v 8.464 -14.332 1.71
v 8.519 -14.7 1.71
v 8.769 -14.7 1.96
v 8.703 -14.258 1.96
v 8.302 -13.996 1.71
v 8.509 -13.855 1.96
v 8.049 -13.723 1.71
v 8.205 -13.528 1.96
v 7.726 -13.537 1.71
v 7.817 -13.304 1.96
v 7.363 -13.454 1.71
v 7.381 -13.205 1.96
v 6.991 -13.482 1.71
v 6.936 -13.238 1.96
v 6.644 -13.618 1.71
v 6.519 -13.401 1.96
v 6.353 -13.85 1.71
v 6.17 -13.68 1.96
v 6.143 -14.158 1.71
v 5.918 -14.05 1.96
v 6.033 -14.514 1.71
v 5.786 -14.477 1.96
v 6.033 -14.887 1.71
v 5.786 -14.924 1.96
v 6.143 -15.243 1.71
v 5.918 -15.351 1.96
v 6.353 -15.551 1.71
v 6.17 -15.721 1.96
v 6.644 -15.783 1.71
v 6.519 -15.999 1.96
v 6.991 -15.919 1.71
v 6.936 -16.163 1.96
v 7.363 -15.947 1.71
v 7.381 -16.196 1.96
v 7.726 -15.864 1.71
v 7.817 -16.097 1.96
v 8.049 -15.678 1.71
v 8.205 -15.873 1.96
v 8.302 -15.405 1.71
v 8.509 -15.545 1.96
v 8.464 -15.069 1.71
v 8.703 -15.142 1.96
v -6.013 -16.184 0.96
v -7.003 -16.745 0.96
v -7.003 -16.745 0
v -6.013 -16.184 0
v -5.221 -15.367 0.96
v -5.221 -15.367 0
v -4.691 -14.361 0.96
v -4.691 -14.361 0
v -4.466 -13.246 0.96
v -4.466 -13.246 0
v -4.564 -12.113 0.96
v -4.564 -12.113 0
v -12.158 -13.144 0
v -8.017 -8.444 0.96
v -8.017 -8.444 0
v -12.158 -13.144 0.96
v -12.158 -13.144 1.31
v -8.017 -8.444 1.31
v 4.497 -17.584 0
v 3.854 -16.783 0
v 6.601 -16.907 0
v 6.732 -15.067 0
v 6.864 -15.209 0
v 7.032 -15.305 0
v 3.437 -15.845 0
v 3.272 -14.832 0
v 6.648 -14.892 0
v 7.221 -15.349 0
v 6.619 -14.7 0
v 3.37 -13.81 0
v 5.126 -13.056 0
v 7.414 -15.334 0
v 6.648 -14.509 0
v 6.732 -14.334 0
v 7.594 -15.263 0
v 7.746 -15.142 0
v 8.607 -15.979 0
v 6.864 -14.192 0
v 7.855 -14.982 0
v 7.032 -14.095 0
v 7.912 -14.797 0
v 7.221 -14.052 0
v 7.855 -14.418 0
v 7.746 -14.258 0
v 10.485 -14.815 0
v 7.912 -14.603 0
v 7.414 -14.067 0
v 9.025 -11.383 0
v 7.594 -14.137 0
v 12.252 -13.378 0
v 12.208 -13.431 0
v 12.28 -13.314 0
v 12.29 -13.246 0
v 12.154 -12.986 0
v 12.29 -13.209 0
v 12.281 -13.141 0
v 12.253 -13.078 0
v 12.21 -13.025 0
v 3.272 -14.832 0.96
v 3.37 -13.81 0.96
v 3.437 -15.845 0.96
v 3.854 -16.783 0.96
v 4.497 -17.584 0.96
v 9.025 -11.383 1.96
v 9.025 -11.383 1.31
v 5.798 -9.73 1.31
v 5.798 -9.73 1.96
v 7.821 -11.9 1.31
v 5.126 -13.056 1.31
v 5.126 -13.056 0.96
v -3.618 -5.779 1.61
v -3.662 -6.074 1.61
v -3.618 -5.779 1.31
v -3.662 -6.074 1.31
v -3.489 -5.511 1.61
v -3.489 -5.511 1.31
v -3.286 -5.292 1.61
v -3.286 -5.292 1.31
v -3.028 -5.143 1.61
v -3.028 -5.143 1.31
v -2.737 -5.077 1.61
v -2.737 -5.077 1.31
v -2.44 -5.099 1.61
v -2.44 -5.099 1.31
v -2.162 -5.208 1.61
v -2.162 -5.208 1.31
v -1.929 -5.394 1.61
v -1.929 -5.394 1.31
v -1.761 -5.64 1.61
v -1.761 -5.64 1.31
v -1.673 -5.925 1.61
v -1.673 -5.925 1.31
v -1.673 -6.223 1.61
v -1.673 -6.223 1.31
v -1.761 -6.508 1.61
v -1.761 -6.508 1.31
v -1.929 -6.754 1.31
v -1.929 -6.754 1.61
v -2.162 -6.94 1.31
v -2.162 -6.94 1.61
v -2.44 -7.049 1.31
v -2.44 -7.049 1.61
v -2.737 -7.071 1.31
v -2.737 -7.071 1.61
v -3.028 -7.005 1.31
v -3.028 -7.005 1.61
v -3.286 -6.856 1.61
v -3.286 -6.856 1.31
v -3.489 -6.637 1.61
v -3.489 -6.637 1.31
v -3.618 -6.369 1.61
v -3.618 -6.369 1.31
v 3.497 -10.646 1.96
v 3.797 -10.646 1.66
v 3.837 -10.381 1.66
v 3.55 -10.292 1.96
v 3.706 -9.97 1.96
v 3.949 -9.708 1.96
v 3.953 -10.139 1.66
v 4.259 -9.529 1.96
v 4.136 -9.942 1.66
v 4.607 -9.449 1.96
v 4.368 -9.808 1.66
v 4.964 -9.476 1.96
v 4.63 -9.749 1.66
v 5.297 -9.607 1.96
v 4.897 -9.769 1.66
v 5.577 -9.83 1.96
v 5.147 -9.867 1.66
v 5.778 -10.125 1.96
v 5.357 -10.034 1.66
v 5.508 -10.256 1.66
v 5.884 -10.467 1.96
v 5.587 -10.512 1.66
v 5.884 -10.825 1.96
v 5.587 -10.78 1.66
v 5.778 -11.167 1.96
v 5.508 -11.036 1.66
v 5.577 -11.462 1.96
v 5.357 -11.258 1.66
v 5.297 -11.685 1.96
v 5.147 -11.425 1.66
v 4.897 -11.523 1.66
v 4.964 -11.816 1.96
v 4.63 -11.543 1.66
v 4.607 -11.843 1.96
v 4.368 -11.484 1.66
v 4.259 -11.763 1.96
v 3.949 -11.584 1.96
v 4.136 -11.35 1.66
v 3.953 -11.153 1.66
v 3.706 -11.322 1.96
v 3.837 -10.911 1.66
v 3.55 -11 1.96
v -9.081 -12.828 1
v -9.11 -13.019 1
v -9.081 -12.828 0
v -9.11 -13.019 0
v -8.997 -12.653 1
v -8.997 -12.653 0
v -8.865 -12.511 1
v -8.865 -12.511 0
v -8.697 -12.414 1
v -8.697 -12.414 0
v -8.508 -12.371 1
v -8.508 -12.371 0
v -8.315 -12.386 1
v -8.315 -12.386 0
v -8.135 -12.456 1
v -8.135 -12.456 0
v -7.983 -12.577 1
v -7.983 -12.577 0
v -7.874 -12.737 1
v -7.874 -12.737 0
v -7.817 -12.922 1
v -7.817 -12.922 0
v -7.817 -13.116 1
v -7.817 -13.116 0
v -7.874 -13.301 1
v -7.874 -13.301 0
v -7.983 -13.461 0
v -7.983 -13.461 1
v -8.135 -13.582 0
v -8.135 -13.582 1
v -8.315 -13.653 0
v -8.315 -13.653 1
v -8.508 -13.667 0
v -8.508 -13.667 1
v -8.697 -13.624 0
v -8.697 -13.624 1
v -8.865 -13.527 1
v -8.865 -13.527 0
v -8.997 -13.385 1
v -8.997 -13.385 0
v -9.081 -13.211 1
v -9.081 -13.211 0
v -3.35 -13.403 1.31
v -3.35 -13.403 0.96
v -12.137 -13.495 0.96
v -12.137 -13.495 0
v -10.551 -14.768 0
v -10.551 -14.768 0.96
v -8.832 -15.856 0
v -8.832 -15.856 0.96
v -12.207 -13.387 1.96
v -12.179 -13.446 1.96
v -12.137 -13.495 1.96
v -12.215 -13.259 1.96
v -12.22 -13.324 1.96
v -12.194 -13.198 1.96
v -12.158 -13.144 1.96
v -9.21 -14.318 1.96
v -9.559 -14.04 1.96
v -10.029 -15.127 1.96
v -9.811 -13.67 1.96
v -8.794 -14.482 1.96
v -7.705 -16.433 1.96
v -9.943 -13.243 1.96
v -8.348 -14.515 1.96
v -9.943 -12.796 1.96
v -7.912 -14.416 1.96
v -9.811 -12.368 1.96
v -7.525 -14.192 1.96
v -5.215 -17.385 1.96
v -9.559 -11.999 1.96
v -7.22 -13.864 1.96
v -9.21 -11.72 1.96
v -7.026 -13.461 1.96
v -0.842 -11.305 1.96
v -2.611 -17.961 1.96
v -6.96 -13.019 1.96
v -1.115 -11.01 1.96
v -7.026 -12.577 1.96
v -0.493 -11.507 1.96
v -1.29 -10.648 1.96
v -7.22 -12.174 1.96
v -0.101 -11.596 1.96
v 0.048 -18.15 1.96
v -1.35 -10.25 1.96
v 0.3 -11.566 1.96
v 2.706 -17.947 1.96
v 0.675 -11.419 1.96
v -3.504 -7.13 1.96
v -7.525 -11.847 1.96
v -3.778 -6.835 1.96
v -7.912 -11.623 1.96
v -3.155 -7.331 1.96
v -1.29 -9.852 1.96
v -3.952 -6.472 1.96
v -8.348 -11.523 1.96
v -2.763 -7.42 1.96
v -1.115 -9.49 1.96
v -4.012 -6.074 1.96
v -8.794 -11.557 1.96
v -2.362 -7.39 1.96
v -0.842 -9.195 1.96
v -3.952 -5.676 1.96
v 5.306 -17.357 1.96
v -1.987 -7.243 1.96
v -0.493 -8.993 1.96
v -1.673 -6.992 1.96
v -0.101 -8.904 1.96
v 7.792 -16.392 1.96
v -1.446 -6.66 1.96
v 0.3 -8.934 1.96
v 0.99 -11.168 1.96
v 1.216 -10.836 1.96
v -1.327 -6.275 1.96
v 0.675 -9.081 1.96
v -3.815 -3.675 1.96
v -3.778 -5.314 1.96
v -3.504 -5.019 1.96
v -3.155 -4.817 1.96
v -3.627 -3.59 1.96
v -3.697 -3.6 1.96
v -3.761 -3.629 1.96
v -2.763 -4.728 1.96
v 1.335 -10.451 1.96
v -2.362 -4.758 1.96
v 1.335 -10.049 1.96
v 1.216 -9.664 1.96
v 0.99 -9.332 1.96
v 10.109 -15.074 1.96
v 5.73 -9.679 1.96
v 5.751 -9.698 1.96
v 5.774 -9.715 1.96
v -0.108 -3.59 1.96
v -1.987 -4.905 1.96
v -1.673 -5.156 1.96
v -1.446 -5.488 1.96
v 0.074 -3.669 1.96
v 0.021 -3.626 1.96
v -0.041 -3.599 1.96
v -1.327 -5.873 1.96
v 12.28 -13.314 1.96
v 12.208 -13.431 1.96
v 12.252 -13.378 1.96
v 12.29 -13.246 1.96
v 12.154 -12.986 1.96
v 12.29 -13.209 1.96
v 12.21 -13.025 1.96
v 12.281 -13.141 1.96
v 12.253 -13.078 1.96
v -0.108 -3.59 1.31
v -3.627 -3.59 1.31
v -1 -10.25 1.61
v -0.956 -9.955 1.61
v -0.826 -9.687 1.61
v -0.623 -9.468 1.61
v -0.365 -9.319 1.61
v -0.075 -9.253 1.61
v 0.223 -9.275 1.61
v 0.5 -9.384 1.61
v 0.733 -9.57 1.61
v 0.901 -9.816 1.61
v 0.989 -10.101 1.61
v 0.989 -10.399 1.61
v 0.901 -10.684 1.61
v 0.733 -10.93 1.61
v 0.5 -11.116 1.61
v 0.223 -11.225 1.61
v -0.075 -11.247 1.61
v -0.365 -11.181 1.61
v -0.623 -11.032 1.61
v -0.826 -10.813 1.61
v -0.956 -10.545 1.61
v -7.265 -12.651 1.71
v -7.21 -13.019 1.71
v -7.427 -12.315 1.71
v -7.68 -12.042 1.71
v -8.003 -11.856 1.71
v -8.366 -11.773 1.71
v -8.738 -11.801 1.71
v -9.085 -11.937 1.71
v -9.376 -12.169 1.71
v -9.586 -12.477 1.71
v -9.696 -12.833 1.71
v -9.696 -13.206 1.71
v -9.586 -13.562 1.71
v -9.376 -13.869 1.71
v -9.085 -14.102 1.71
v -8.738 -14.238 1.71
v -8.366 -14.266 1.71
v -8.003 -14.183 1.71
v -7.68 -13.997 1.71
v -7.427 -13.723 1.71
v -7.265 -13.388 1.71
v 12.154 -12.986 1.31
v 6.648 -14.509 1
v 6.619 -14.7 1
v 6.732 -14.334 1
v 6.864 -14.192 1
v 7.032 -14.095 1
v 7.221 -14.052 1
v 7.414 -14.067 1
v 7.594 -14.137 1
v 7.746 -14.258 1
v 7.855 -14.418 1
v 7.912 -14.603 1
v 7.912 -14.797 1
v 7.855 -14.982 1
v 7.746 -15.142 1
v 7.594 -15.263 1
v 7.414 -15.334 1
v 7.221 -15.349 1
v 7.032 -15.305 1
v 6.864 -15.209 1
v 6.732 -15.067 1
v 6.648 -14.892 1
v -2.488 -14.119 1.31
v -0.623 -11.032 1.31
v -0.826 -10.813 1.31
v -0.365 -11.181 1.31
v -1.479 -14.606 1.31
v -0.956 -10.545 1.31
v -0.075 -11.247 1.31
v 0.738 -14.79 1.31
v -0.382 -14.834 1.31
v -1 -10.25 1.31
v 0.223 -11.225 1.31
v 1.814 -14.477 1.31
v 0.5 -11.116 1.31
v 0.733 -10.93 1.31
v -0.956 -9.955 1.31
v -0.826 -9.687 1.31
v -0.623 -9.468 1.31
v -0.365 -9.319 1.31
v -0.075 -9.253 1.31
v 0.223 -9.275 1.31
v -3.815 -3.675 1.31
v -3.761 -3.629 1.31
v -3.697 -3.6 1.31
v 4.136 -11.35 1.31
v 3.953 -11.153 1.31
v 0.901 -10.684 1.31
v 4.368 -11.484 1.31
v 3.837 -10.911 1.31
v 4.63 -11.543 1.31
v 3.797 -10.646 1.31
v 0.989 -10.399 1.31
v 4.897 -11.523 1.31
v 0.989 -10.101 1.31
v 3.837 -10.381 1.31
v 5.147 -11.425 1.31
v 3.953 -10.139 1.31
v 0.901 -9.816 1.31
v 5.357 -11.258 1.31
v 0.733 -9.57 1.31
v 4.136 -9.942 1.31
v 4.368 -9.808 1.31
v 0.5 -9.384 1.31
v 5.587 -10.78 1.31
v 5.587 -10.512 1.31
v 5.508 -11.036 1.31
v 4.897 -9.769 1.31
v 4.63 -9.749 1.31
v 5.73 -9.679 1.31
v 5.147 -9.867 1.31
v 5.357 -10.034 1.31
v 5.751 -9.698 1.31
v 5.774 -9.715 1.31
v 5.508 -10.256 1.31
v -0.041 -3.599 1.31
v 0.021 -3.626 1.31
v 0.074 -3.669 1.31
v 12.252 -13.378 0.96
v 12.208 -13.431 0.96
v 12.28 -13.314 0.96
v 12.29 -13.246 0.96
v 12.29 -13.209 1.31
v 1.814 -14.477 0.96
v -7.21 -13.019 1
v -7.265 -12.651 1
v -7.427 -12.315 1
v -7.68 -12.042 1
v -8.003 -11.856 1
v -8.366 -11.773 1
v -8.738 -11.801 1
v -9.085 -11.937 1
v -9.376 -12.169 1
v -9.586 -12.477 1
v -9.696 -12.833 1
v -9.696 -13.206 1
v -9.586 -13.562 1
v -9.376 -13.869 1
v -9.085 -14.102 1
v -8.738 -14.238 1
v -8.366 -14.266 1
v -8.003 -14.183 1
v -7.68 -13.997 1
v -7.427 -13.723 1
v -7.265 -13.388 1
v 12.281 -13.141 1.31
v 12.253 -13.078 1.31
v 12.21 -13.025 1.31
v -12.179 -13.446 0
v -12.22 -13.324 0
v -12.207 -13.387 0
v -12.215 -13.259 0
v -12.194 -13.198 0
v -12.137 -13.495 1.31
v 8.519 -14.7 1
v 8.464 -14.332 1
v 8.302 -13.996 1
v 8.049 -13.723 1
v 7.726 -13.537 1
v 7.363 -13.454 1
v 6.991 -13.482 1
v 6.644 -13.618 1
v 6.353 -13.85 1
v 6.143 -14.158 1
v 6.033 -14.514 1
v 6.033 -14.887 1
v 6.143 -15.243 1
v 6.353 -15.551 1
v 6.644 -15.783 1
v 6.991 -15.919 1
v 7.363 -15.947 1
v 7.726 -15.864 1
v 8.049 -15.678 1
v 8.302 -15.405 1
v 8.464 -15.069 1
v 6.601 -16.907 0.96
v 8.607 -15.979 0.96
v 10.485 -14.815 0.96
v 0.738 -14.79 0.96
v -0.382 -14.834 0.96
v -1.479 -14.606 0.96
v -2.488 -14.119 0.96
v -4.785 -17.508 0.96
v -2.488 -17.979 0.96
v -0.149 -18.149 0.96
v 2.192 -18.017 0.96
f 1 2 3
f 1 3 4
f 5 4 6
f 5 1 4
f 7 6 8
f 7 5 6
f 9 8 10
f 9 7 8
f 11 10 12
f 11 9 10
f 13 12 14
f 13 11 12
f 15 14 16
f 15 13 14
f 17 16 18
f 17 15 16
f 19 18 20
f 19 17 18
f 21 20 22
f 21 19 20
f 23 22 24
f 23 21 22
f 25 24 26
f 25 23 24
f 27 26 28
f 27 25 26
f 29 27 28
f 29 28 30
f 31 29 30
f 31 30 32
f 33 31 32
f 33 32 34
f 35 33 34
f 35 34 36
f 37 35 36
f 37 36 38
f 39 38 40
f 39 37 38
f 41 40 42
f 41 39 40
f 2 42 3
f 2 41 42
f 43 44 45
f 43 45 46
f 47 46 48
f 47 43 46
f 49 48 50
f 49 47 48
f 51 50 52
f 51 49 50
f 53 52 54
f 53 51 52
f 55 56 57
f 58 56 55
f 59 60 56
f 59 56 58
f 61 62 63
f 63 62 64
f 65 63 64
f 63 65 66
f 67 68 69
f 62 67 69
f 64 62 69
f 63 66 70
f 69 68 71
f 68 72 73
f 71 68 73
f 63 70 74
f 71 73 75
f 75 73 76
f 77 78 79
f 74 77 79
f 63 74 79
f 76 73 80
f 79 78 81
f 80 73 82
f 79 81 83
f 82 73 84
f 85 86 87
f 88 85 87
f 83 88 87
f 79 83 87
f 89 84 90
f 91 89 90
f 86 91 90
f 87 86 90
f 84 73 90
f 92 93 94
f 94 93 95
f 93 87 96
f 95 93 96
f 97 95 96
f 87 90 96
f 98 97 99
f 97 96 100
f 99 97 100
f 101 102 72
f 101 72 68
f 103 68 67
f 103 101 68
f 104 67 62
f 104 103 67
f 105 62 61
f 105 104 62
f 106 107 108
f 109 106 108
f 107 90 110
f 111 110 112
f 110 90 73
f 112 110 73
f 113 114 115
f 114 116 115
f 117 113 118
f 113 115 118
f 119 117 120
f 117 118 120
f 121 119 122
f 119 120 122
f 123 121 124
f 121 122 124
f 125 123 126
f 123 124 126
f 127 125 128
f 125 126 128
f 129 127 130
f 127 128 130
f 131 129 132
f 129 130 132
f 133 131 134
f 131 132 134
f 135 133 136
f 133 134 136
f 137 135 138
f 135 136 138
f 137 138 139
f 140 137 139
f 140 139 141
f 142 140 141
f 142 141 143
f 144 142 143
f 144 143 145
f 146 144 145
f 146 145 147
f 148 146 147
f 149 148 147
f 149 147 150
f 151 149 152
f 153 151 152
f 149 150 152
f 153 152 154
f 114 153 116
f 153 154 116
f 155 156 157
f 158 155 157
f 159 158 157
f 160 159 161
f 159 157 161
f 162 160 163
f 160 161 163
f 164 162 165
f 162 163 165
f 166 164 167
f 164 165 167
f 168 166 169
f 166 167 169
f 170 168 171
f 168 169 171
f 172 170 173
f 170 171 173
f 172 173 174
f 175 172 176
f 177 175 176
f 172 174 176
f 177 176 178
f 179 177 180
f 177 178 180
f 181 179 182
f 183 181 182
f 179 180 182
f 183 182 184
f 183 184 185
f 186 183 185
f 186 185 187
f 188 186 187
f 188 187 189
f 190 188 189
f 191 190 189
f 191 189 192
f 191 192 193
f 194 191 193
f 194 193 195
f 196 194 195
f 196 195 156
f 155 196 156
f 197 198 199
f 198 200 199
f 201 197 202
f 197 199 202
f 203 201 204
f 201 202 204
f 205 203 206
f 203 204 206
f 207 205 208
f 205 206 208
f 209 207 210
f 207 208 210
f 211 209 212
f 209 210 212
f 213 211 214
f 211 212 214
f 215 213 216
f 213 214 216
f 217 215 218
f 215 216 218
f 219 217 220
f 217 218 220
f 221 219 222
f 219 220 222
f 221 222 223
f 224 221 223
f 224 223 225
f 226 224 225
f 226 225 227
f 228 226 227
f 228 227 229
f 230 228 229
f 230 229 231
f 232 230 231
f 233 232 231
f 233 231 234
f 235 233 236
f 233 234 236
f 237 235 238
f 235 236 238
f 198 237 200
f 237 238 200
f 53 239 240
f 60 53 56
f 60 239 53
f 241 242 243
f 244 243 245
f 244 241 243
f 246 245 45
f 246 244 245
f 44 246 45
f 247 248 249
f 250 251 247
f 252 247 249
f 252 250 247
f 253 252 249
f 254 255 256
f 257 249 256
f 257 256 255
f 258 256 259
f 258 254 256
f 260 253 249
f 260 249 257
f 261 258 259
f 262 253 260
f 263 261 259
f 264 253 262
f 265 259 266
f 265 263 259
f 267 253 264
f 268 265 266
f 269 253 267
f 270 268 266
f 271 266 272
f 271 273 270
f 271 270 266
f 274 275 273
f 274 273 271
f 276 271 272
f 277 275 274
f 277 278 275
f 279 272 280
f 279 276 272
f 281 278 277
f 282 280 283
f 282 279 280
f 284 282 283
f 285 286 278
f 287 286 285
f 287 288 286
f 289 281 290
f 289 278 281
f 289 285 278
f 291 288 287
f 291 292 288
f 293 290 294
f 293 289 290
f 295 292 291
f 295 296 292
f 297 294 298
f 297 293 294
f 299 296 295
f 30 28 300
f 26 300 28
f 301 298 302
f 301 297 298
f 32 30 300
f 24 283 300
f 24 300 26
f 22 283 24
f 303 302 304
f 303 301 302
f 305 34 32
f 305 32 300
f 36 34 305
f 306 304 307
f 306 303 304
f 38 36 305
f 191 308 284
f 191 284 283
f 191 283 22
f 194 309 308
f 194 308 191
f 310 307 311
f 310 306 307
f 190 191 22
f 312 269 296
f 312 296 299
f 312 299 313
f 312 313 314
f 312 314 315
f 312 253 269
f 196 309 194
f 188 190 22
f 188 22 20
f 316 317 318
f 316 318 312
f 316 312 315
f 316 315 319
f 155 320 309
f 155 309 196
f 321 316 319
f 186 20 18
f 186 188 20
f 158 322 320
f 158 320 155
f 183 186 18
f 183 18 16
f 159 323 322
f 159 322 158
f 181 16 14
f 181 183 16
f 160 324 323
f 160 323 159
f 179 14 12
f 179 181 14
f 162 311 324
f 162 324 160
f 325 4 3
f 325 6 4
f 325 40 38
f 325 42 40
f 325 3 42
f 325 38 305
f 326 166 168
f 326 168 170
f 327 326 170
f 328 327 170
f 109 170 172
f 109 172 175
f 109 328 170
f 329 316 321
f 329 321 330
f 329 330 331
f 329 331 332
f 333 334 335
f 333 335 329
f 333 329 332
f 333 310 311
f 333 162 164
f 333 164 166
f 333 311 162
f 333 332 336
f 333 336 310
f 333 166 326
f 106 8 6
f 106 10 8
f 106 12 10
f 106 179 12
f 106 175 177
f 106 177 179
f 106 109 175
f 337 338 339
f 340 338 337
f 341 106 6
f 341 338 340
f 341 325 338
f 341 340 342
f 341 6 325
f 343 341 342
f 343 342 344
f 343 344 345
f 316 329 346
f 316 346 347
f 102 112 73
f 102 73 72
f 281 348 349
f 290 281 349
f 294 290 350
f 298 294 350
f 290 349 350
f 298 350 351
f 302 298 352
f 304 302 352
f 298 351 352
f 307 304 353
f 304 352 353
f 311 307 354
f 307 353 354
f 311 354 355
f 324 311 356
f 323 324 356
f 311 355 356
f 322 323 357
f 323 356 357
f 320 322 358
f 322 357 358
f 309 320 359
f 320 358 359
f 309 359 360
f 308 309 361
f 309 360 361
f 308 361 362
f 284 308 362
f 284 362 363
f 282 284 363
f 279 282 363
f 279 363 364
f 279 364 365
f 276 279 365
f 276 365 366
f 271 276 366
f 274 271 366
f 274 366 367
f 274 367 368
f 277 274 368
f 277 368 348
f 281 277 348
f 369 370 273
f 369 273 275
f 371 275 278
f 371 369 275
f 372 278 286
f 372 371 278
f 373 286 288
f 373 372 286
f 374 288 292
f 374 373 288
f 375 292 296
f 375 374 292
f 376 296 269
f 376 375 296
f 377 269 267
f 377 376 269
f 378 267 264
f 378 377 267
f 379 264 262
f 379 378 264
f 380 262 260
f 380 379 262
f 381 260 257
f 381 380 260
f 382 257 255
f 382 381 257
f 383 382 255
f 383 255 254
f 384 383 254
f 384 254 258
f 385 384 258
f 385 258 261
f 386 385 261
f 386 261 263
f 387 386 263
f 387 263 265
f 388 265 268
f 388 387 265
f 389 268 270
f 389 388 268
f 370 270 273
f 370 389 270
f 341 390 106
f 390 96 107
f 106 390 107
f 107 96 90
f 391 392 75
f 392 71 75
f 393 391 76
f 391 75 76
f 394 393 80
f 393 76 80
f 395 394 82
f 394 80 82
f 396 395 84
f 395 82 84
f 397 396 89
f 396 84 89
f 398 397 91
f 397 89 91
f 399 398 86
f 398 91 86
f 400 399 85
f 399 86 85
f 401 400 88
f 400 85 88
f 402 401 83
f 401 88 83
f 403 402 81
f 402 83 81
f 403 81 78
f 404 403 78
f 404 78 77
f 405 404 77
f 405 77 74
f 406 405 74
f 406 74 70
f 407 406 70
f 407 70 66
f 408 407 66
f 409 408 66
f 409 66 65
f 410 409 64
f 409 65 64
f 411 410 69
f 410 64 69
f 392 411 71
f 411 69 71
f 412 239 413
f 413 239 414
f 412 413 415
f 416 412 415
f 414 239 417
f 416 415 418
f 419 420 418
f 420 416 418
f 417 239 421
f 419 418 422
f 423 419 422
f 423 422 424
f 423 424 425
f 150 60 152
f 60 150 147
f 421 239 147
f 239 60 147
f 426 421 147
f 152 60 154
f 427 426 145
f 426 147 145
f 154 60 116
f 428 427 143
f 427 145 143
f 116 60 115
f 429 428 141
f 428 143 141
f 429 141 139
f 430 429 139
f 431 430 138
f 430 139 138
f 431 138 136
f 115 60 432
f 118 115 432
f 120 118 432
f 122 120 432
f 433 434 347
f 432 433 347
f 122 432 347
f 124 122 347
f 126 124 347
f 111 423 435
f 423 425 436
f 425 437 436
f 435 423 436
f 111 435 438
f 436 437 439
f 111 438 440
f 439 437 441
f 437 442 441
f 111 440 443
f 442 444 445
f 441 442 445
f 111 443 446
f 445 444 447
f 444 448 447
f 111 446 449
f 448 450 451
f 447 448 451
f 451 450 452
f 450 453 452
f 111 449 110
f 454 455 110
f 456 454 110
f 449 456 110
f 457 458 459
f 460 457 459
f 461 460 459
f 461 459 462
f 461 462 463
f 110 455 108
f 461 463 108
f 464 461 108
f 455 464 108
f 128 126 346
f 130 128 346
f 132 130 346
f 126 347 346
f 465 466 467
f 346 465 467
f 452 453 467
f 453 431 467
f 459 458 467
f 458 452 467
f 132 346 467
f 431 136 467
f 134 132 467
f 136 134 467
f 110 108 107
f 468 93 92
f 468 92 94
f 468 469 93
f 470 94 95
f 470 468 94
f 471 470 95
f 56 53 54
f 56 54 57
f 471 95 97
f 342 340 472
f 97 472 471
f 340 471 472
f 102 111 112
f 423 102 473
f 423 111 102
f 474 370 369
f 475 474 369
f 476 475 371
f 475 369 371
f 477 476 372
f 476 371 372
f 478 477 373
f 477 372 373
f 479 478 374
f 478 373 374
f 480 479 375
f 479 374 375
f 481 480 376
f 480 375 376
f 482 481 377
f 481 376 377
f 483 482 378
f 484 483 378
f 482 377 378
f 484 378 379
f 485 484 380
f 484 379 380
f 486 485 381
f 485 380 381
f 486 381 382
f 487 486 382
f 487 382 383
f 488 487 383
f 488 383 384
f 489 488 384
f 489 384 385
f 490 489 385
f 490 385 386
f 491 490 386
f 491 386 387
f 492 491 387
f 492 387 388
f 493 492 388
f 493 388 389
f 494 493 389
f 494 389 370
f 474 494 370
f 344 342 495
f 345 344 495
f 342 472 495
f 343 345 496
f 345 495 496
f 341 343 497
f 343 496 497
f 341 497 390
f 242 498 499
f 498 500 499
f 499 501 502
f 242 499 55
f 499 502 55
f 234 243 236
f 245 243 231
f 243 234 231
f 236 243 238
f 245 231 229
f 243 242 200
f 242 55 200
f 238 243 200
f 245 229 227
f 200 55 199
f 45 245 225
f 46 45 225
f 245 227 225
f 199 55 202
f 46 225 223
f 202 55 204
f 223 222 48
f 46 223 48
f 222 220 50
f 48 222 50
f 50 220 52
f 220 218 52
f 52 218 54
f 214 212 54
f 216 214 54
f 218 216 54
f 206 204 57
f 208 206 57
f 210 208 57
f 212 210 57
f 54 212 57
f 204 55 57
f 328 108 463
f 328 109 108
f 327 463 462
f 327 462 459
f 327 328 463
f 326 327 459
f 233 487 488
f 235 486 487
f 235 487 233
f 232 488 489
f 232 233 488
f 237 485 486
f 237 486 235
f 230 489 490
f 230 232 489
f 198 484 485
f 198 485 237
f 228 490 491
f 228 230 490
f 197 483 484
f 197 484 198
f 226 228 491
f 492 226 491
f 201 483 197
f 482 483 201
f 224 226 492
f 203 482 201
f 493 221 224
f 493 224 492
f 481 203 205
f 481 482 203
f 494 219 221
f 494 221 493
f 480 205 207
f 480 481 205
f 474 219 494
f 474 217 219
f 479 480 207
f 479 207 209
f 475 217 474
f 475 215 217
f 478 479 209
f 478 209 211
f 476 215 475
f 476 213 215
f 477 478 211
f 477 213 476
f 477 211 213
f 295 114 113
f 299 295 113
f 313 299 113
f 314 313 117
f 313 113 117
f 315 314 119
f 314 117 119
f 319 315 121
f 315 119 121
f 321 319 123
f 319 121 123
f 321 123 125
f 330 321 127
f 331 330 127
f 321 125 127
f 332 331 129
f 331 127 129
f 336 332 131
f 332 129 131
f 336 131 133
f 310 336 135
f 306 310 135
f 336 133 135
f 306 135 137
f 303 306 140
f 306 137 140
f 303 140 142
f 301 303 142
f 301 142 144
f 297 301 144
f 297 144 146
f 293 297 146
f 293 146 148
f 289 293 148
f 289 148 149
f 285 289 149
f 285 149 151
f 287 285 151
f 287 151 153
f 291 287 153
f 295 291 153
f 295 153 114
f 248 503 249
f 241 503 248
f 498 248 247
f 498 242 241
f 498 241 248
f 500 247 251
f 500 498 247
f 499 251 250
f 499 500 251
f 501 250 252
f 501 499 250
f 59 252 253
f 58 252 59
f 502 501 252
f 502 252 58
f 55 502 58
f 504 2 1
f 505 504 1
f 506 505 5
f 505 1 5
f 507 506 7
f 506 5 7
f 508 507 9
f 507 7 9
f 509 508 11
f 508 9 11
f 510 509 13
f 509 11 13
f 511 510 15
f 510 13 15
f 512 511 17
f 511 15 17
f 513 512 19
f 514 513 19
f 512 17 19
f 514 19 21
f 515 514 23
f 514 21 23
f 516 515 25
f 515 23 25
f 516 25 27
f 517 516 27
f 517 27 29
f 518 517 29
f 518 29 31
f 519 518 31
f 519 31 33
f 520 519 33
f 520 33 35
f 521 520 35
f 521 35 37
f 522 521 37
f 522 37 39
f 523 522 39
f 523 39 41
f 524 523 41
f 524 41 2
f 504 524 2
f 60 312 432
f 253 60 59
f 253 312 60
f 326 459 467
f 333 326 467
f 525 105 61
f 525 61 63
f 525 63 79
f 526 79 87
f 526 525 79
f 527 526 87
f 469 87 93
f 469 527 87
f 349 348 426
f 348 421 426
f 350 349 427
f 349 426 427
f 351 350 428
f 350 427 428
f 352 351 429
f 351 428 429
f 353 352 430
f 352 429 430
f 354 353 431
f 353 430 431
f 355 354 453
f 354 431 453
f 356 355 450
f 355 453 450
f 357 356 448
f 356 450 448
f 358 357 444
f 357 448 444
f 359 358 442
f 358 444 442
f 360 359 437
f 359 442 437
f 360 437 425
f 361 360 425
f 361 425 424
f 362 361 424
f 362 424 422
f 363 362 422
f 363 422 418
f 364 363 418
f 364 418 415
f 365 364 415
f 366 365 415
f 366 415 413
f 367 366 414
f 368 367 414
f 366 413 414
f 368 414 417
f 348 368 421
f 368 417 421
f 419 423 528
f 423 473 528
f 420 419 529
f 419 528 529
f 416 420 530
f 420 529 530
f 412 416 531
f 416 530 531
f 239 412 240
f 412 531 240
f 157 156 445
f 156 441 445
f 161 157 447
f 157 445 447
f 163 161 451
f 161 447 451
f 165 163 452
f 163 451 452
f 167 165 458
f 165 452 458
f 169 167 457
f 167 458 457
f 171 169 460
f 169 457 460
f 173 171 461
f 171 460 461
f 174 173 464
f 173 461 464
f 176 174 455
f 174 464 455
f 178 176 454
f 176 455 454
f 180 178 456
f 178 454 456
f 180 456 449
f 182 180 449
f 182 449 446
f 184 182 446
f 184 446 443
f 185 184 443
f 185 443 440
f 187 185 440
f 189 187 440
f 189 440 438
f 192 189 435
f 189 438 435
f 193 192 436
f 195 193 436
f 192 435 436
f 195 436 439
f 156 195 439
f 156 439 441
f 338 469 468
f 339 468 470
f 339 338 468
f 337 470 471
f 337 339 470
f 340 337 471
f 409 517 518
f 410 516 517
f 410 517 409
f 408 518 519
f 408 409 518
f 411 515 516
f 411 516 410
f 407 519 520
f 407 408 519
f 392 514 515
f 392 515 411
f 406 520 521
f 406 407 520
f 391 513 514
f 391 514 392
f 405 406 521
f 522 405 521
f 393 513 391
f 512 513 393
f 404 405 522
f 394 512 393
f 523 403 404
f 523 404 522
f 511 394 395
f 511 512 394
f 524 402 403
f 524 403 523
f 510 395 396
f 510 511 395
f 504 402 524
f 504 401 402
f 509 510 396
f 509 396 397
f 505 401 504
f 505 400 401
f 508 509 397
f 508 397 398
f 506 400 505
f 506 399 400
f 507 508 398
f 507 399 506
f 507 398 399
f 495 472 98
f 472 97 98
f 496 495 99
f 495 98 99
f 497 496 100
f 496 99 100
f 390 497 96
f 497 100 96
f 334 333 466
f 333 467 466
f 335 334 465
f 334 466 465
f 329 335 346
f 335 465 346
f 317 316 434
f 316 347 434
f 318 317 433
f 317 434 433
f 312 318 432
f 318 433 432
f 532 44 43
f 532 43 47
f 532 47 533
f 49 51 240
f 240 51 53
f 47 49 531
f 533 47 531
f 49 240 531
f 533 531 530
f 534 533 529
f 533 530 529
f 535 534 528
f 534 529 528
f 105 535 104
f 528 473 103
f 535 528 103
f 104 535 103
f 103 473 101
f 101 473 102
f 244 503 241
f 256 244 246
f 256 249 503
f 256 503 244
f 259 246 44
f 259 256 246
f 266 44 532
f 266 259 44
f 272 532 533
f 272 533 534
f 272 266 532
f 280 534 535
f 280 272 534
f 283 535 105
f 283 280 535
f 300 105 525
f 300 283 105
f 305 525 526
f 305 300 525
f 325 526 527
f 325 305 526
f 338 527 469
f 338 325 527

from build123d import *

# Parameters (mm, degrees)
BOSS_EXTRUDE1_DEPTH = 0.65
SKETCH2_W           = 0.65
SKETCH2_H           = 9.465837675
CUT_EXTRUDE1_DEPTH  = 12.29
BOSS_EXTRUDE2_DEPTH = 0.35
BOSS_EXTRUDE3_DEPTH = 0.96
BOSS_EXTRUDE4_DEPTH = 0.96
DRAFT1_START        = 1.31
DRAFT1_DEPTH        = 0.65
DRAFT2_DEPTH        = 1.96
DRAFT2_START        = 1.31
DRAFT2_2_DEPTH      = 0.65
HOLE1_D             = 1.3
HOLE1_CBORE_D       = 2.5
HOLE1_CBORE_DEPTH   = 0.96
HOLE2_D             = 2
HOLE2_DEPTH         = 1.960025
HOLE2_CSINK_D       = 2.7
HOLE2_CSINK_ANGLE   = 90
HOLE3_D             = 1.8
HOLE3_DEPTH         = 1.960025
HOLE3_CSINK_D       = 2.4
HOLE3_CSINK_ANGLE   = 90
CHAMFER1_SIZE       = 0.25
FILLET1_R           = 0.25
FILLET2_R           = 4.6


# Read off the part's stored shape, not the designer's step: Draft1, Draft2
with BuildPart() as part:
    # Sketch1 → Boss-Extrude1 (new body)
    with BuildSketch(Plane.XY.offset(1.96)):
        with BuildLine():
            Line((-3.74, -3.59), (-12.32, -13.328169417))
            ThreePointArc((-12.32, -13.328169417), (-0.020405468, -18.149988529), (12.29, -13.355837675))
            Line((12.29, -13.355837675), (12.29, -3.59))
            Line((12.29, -3.59), (-3.74, -3.59))
        make_face()
    extrude(amount=-BOSS_EXTRUDE1_DEPTH)

    # Sketch2 → Cut-Extrude1 (cut)
    with BuildSketch(Plane(origin=(12.29, 0, 0), x_dir=(0, 0, -1), z_dir=(1, 0, 0))):
        with Locations((-1.635, -8.322918838)):
            Rectangle(SKETCH2_W, SKETCH2_H)
    extrude(amount=-CUT_EXTRUDE1_DEPTH, mode=Mode.SUBTRACT)

    # Sketch3 → Boss-Extrude2 (add)
    with BuildSketch(Plane(origin=(0, 0, 1.31), x_dir=(-1, 0, 0), z_dir=(0, 0, -1))):
        with BuildLine():
            Line((1.143818798, -15.746447607), (8.016709975, -8.444000732))
            Line((8.016709975, -8.444000732), (12.32, -13.328169417))
            ThreePointArc((12.32, -13.328169417), (0.020405468, -18.149988529), (-12.29, -13.355837675))
            Line((-12.29, -13.355837675), (-12.29, -13.055837675))
            Line((-12.29, -13.055837675), (-5.126410253, -13.055837675))
            Line((-5.126410253, -13.055837675), (1.143818798, -15.746447607))
        make_face()
    extrude(amount=BOSS_EXTRUDE2_DEPTH)

    # Sketch4 → Boss-Extrude3 (add)
    with BuildSketch(Plane(origin=(0, 0, 0.96), x_dir=(-1, 0, 0), z_dir=(0, 0, -1))):
        with BuildLine():
            Line((-12.29, -13.055837675), (-5.126410253, -13.055837675))
            Line((-5.126410253, -13.055837675), (-3.369826358, -13.809603133))
            ThreePointArc((-3.369826358, -13.809603133), (-3.436718106, -15.84520854), (-4.497267699, -17.584000775))
            ThreePointArc((-4.497267699, -17.584000775), (-8.655774373, -15.953058328), (-12.29, -13.355837675))
            Line((-12.29, -13.355837675), (-12.29, -13.055837675))
        make_face()
    extrude(amount=BOSS_EXTRUDE3_DEPTH)

    # Sketch5 → Boss-Extrude4 (add)
    with BuildSketch(Plane(origin=(0, 0, 0.96), x_dir=(-1, 0, 0), z_dir=(0, 0, -1))):
        with BuildLine():
            Line((4.563917341, -12.112592905), (8.016709975, -8.444000732))
            Line((8.016709975, -8.444000732), (12.32, -13.328169417))
            ThreePointArc((12.32, -13.328169417), (9.811348174, -15.269575862), (7.003003277, -16.744564644))
            ThreePointArc((7.003003277, -16.744564644), (4.920508914, -14.882988414), (4.563917341, -12.112592905))
        make_face()
    extrude(amount=BOSS_EXTRUDE4_DEPTH)

    # Draft1 outline → Draft1 (add)
    with BuildSketch(Plane.XY.offset(DRAFT1_START)):
        Polygon((0, -13.055837675), (8.909023694, -13.055837675), (0, -3.59), align=None)
    extrude(amount=DRAFT1_DEPTH)

    # Draft2 outline → Draft2 (add)
    with BuildSketch(Plane.XY):
        Polygon((12.29, -13.055837675), (9.025, -11.382918837), (5.126410253, -13.055837675), align=None)
    extrude(amount=DRAFT2_DEPTH)

    # Draft2 2 outline → Draft2 2 (add)
    with BuildSketch(Plane.XY.offset(DRAFT2_START)):
        Polygon((7.820834561, -11.899636721), (9.025, -11.382918837), (5.76, -9.71), align=None)
    extrude(amount=DRAFT2_2_DEPTH)

    # Hole1 (through all)
    with Locations(Plane.XY.offset(1.96)):
        with Locations((7.269383833, -14.700362078), (-8.459801911, -13.019281065)):
            CounterBoreHole(HOLE1_D / 2, HOLE1_CBORE_D / 2, HOLE1_CBORE_DEPTH)

    # Hole2
    with Locations(Plane.XY.offset(1.96)):
        with Locations((0, -10.25), (-2.662261998, -6.0740848)):
            CounterSinkHole(HOLE2_D / 2, HOLE2_CSINK_D / 2, depth=HOLE2_DEPTH, counter_sink_angle=HOLE2_CSINK_ANGLE)

    # Hole3
    with Locations(Plane.XY.offset(1.96)):
        with Locations((4.697017702, -10.646000252)):
            CounterSinkHole(HOLE3_D / 2, HOLE3_CSINK_D / 2, depth=HOLE3_DEPTH, counter_sink_angle=HOLE3_CSINK_ANGLE)

    # Chamfer1
    chamfer1_edges = [part.edges().sort_by_distance(p)[0] for p in [
        (-9.709801911, -13.019281065, 1.96),
        (6.019383833, -14.700362078, 1.96),
    ]]
    chamfer(chamfer1_edges, length=CHAMFER1_SIZE)

    # Fillet1
    fillet1_edges = [part.edges().sort_by_distance(p)[0] for p in [
        (5.76, -9.71, 1.635),
        (-12.32, -13.328169417, 0.98),
        (12.29, -13.055837675, 0.98),
        (12.29, -13.355837675, 0.98),
        (0, -3.59, 1.635),
        (-3.74, -3.59, 1.635),
    ]]
    fillet(fillet1_edges, radius=FILLET1_R)

    # Fillet2
    fillet2_edges = [part.edges().sort_by_distance(p)[0] for p in [
        (-1.143818798, -15.746447607, 1.135),
    ]]
    fillet(fillet2_edges, radius=FILLET2_R)


solid = part.part
